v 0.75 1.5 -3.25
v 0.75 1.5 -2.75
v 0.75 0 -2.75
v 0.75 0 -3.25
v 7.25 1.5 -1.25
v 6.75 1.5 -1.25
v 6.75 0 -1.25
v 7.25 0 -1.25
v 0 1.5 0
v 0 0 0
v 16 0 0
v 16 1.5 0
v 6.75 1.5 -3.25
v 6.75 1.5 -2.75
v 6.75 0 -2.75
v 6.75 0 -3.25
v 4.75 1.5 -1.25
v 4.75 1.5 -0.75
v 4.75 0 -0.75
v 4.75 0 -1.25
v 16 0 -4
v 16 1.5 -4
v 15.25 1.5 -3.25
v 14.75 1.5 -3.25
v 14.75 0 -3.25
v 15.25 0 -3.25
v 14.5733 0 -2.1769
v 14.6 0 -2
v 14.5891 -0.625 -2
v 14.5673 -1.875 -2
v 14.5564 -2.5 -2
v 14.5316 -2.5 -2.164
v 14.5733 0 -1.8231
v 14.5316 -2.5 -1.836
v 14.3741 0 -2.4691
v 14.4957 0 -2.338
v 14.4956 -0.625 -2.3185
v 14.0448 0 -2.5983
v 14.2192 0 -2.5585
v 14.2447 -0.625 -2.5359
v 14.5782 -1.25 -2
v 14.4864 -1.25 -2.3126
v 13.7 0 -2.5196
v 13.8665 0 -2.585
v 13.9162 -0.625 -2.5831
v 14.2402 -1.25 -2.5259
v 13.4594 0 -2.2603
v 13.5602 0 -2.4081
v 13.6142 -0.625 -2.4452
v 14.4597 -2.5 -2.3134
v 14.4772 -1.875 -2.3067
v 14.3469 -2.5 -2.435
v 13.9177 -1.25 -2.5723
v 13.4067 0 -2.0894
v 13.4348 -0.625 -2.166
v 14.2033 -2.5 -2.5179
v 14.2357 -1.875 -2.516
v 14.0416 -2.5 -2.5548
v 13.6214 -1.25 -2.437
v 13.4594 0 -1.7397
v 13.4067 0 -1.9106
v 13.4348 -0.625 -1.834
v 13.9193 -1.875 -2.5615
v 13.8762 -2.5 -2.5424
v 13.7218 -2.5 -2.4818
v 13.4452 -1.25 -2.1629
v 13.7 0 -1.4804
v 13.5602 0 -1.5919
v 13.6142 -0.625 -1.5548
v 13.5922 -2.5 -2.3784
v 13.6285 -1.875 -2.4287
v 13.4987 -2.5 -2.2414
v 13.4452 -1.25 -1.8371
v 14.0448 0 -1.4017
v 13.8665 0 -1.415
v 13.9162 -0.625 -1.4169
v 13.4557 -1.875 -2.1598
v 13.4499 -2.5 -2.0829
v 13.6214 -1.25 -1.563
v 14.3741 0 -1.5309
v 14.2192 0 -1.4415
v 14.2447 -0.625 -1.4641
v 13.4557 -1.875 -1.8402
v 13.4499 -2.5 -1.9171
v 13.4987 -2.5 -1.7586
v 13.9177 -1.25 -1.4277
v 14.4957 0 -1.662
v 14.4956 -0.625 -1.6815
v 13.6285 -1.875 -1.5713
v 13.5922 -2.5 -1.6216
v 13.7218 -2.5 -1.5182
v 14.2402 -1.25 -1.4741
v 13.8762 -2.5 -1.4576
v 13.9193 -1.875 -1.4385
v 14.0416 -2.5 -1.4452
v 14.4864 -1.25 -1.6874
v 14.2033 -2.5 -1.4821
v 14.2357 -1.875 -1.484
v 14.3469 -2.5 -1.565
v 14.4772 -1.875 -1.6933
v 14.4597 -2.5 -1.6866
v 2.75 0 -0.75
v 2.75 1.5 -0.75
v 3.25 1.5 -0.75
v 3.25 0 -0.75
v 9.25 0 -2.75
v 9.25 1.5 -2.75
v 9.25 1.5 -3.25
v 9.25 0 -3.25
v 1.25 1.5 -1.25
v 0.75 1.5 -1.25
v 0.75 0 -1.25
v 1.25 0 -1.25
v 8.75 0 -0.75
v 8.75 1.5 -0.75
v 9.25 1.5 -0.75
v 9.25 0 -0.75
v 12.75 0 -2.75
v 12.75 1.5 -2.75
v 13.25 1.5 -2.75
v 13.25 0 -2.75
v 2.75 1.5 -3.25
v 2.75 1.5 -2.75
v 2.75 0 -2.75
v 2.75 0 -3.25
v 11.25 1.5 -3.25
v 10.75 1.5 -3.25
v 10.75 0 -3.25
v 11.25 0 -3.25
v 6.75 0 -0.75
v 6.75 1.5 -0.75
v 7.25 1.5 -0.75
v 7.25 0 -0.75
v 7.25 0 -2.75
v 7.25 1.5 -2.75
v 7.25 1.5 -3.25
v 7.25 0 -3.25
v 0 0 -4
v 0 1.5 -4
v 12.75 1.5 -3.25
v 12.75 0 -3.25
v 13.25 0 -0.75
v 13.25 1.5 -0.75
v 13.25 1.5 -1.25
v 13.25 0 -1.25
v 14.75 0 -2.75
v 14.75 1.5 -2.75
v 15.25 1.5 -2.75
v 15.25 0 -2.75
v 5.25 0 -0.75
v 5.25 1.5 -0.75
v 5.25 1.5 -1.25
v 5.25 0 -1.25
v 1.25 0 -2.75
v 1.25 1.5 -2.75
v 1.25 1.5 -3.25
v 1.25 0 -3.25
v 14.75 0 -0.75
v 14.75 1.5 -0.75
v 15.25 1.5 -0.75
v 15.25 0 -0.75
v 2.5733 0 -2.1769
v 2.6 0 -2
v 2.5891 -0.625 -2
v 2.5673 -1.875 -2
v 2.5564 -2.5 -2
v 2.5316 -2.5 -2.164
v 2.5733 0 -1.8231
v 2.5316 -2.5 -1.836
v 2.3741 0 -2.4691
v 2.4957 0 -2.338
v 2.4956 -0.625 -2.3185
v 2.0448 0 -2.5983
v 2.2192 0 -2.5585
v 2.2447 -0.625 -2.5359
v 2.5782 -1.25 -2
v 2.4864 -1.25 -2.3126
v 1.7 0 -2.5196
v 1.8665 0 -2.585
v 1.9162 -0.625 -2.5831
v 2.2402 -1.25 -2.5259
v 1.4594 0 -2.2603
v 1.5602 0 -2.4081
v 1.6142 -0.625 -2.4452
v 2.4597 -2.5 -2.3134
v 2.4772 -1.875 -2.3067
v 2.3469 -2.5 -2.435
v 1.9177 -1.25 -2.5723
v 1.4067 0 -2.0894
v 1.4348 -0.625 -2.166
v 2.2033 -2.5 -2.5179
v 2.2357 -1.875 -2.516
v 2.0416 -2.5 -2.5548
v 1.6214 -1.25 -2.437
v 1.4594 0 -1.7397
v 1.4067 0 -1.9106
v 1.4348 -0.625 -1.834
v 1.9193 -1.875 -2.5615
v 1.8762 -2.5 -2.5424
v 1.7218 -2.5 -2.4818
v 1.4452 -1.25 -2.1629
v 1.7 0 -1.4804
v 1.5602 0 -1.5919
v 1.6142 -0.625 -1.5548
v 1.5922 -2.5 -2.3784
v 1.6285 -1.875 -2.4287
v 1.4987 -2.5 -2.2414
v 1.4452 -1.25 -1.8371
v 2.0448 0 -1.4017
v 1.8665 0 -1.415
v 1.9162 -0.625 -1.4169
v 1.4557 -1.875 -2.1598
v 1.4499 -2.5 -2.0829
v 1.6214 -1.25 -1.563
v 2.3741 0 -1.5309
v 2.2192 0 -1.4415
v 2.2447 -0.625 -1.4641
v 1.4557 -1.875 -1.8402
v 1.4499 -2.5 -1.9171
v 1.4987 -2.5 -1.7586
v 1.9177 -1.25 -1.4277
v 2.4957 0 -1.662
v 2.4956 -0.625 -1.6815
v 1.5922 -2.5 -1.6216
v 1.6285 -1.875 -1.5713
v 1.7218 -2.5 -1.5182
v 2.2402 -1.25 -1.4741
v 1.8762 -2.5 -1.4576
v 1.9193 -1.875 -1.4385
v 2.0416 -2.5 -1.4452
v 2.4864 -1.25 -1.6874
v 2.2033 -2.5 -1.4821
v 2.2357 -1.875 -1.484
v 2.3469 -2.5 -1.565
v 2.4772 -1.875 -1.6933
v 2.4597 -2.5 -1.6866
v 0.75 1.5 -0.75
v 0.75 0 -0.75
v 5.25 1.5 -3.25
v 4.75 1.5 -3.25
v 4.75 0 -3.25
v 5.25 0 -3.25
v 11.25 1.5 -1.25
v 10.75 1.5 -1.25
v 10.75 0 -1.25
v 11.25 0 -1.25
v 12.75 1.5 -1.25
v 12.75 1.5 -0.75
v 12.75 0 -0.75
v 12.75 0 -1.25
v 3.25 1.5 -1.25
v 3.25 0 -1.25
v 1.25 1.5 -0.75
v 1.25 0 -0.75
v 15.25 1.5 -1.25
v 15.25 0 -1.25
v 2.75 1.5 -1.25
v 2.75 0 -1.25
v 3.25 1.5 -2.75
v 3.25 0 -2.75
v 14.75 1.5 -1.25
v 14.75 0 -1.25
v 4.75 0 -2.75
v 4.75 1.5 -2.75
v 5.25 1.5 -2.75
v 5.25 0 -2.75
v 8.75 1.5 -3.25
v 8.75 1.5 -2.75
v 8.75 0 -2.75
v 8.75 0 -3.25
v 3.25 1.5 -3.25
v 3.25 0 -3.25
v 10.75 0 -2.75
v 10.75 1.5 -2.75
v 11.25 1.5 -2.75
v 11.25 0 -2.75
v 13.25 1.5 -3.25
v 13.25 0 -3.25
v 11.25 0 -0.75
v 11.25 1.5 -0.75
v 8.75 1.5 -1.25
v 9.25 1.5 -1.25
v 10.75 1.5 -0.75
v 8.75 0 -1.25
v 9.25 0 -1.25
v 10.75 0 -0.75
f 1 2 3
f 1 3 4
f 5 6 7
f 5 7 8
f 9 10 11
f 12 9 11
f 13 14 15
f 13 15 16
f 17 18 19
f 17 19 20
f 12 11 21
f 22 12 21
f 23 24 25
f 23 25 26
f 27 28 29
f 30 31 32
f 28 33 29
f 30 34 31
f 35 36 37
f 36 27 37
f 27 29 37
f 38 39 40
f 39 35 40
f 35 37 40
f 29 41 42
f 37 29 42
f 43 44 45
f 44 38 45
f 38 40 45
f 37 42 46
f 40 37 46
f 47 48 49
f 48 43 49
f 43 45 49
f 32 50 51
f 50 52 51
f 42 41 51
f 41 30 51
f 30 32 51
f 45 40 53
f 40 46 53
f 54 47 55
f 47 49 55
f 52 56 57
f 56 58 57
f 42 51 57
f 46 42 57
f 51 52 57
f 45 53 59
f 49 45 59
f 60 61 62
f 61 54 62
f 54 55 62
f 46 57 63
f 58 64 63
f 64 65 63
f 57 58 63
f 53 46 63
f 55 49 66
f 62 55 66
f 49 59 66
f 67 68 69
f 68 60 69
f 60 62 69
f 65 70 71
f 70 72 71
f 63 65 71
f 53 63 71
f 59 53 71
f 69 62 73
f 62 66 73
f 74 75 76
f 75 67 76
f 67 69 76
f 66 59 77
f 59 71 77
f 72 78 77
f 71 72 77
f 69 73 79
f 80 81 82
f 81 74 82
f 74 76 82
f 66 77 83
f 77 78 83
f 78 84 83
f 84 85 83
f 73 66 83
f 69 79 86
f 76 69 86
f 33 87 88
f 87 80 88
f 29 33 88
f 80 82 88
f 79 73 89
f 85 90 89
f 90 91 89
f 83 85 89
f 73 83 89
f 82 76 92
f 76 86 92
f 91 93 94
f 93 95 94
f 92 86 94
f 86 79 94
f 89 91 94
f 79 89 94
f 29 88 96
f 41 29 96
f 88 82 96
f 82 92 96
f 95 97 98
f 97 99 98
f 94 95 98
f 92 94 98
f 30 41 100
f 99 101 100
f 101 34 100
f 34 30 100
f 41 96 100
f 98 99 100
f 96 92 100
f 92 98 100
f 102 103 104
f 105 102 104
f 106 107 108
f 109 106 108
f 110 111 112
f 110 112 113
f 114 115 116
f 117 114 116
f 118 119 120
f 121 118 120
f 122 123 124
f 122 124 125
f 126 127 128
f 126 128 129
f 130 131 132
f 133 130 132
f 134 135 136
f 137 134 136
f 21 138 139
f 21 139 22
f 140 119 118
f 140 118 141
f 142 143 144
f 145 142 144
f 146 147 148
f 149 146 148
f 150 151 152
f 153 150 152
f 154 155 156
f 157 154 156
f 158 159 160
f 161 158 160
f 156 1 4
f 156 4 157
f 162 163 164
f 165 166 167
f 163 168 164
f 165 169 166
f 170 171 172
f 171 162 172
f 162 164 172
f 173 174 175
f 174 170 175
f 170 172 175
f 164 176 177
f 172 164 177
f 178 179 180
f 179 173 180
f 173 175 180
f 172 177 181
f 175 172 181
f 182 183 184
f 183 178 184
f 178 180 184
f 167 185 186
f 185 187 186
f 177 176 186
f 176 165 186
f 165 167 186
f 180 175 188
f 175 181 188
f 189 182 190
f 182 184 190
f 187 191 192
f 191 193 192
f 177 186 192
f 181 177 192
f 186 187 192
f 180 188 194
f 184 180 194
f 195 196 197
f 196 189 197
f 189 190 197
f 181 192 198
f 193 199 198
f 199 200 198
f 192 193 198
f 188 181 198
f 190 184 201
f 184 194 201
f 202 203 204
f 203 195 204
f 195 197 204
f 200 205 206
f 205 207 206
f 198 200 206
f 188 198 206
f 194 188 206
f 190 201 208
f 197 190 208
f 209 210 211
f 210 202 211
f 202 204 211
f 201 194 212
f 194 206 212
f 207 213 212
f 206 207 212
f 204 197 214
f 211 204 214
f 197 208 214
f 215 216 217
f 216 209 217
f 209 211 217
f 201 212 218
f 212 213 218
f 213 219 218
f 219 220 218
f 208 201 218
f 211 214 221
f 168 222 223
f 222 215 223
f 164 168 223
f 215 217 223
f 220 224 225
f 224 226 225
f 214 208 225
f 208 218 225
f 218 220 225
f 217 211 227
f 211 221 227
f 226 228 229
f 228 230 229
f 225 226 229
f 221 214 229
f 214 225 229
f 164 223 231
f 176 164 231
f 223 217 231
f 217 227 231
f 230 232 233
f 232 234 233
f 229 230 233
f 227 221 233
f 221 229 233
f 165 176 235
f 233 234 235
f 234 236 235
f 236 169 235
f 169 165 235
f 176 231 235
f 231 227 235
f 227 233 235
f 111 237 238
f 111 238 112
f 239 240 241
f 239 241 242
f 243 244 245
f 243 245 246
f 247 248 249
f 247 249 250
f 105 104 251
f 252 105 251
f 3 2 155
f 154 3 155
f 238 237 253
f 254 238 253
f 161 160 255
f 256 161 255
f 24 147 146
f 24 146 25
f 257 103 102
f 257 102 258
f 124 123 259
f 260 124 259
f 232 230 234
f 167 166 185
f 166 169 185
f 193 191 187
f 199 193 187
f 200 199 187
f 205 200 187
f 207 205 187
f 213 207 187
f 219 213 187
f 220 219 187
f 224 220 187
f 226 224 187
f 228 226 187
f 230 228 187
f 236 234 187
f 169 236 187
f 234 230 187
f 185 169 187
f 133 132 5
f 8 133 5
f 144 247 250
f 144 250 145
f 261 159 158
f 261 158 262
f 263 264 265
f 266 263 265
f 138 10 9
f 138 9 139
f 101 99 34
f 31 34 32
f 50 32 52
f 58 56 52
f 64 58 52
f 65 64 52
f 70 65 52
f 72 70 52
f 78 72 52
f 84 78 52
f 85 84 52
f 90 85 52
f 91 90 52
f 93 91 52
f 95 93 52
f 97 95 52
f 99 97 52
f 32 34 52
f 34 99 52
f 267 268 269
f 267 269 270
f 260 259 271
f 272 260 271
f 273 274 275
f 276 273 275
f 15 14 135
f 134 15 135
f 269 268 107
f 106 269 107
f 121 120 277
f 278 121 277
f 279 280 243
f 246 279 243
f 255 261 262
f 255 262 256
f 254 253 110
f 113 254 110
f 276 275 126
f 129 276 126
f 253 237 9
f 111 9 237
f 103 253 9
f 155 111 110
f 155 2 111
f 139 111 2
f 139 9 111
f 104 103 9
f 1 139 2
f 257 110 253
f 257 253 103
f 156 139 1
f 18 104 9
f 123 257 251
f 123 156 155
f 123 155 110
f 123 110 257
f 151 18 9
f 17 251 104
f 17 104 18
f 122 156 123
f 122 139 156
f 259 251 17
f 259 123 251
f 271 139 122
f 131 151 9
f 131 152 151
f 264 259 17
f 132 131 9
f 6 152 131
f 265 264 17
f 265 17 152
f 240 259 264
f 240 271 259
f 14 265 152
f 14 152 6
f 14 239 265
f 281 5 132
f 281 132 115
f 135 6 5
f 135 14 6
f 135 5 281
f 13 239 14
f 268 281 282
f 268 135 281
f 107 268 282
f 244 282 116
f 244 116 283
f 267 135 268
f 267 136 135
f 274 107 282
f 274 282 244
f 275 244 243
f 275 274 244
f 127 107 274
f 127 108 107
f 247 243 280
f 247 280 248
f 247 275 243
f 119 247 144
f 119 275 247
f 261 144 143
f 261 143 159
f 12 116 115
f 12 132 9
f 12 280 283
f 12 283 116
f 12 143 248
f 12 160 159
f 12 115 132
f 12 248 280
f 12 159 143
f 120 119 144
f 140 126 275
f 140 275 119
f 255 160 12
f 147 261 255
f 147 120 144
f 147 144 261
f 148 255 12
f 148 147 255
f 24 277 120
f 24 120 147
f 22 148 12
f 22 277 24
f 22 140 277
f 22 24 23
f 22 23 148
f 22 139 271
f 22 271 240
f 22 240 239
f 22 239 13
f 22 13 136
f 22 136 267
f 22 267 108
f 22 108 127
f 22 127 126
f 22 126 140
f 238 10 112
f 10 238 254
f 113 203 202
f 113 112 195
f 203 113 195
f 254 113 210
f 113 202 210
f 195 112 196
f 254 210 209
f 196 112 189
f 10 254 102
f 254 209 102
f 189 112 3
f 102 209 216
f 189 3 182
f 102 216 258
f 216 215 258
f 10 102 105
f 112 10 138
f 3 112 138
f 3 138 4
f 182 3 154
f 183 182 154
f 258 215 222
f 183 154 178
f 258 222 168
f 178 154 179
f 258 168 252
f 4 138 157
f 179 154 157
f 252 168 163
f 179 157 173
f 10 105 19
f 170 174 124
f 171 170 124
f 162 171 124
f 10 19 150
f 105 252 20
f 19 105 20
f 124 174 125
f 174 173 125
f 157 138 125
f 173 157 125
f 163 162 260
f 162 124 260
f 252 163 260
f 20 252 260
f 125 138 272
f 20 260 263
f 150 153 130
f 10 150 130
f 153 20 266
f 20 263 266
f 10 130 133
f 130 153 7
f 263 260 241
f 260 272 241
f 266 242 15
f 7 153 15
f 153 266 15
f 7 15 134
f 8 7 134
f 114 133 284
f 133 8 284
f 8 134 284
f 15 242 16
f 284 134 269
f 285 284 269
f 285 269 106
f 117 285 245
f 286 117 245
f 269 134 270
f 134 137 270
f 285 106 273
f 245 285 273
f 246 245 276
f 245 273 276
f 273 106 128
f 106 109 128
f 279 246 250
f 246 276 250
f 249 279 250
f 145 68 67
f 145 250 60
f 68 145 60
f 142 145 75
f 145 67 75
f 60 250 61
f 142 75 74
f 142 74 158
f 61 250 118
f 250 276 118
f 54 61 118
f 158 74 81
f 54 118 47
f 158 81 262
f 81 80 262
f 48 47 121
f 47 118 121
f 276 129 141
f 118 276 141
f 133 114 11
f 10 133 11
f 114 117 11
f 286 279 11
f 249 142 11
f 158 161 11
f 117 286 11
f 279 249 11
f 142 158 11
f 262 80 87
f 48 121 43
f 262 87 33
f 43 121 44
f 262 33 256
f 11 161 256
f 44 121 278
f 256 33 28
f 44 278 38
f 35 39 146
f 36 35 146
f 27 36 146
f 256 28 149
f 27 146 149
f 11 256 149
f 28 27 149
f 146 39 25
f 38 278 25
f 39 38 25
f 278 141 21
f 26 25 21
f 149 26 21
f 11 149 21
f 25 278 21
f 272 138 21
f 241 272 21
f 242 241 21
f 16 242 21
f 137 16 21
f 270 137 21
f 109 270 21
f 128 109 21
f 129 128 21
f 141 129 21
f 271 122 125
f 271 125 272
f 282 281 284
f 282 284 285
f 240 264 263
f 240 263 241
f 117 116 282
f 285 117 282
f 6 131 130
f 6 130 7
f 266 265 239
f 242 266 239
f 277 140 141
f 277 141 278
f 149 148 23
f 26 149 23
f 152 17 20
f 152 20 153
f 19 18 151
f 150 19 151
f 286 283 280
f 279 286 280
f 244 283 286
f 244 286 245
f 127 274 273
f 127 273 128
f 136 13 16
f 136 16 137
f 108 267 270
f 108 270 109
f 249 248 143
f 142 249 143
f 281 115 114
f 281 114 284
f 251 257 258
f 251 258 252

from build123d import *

# Parameters (mm, degrees)
SKETCH1_W                     = 16
SKETCH1_H                     = 4
BOSS_EXTRUDE1_DEPTH           = 1.5
SKETCH2_W                     = 0.5
SKETCH2_H                     = 0.5
CUT_EXTRUDE1_DEPTH            = 2
SKETCH3_R                     = 0.6
BOSS_EXTRUDE2_DEPTH           = 2.5
BOSS_EXTRUDE2_DRAFT           = -1
BOSS_EXTRUDE2_PROFILE_2_DEPTH = 2.5
BOSS_EXTRUDE2_PROFILE_2_DRAFT = -1


with BuildPart() as part:
    # Sketch1 → Boss-Extrude1 (new body)
    with BuildSketch(Plane(origin=(0, 0, 0), x_dir=(1, 0, 0), z_dir=(0, 1, 0))):
        with Locations((8, 2)):
            Rectangle(SKETCH1_W, SKETCH1_H)
    extrude(amount=BOSS_EXTRUDE1_DEPTH)

    # Sketch2 → Cut-Extrude1 (cut)
    with BuildSketch(Plane(origin=(0, 1.5, 0), x_dir=(1, 0, 0), z_dir=(0, 1, 0))):
        with Locations((3, 3)):
            Rectangle(SKETCH2_W, SKETCH2_H)
        with Locations((1, 3)):
            Rectangle(SKETCH2_W, SKETCH2_H)
        with Locations((5, 3)):
            Rectangle(SKETCH2_W, SKETCH2_H)
        with Locations((7, 3)):
            Rectangle(SKETCH2_W, SKETCH2_H)
        with Locations((9, 3)):
            Rectangle(SKETCH2_W, SKETCH2_H)
        with Locations((11, 3)):
            Rectangle(SKETCH2_W, SKETCH2_H)
        with Locations((13, 3)):
            Rectangle(SKETCH2_W, SKETCH2_H)
        with Locations((15, 3)):
            Rectangle(SKETCH2_W, SKETCH2_H)
        with Locations((17, 3)):
            Rectangle(SKETCH2_W, SKETCH2_H)
        with Locations((19, 3)):
            Rectangle(SKETCH2_W, SKETCH2_H)
        with Locations((21, 3)):
            Rectangle(SKETCH2_W, SKETCH2_H)
        with Locations((23, 3)):
            Rectangle(SKETCH2_W, SKETCH2_H)
        with Locations((25, 3)):
            Rectangle(SKETCH2_W, SKETCH2_H)
        with Locations((27, 3)):
            Rectangle(SKETCH2_W, SKETCH2_H)
        with Locations((29, 3)):
            Rectangle(SKETCH2_W, SKETCH2_H)
        with Locations((31, 3)):
            Rectangle(SKETCH2_W, SKETCH2_H)
        with Locations((33, 3)):
            Rectangle(SKETCH2_W, SKETCH2_H)
        with Locations((35, 3)):
            Rectangle(SKETCH2_W, SKETCH2_H)
        with Locations((1, 1)):
            Rectangle(SKETCH2_W, SKETCH2_H)
        with Locations((3, 1)):
            Rectangle(SKETCH2_W, SKETCH2_H)
        with Locations((5, 1)):
            Rectangle(SKETCH2_W, SKETCH2_H)
        with Locations((7, 1)):
            Rectangle(SKETCH2_W, SKETCH2_H)
        with Locations((9, 1)):
            Rectangle(SKETCH2_W, SKETCH2_H)
        with Locations((11, 1)):
            Rectangle(SKETCH2_W, SKETCH2_H)
        with Locations((13, 1)):
            Rectangle(SKETCH2_W, SKETCH2_H)
        with Locations((15, 1)):
            Rectangle(SKETCH2_W, SKETCH2_H)
        with Locations((17, 1)):
            Rectangle(SKETCH2_W, SKETCH2_H)
        with Locations((19, 1)):
            Rectangle(SKETCH2_W, SKETCH2_H)
        with Locations((21, 1)):
            Rectangle(SKETCH2_W, SKETCH2_H)
        with Locations((23, 1)):
            Rectangle(SKETCH2_W, SKETCH2_H)
        with Locations((25, 1)):
            Rectangle(SKETCH2_W, SKETCH2_H)
        with Locations((27, 1)):
            Rectangle(SKETCH2_W, SKETCH2_H)
        with Locations((29, 1)):
            Rectangle(SKETCH2_W, SKETCH2_H)
        with Locations((31, 1)):
            Rectangle(SKETCH2_W, SKETCH2_H)
        with Locations((33, 1)):
            Rectangle(SKETCH2_W, SKETCH2_H)
        with Locations((35, 1)):
            Rectangle(SKETCH2_W, SKETCH2_H)
    extrude(amount=-CUT_EXTRUDE1_DEPTH, mode=Mode.SUBTRACT)


with BuildPart() as boss_extrude2_tool:
    # Sketch3 → Boss-Extrude2 (with draft: the straight prism first)
    with BuildSketch(Plane(origin=(0, 0, 0), x_dir=(1, 0, 0), z_dir=(0, 1, 0))):
        with Locations((2, 2)):
            Circle(SKETCH3_R)
    extrude(amount=-BOSS_EXTRUDE2_DEPTH)
    # Boss-Extrude2: the draft: its side faces are tilted about the plane it starts from
    boss_extrude2_sides = [boss_extrude2_tool.faces().sort_by_distance(p)[0] for p in [
        (1.4, -1.25, -2),
    ]]
    draft(boss_extrude2_sides, Plane(origin=(0, 0, 0), x_dir=(1, 0, 0), z_dir=(0, 1, 0)), BOSS_EXTRUDE2_DRAFT)


with BuildPart() as part_1:
    add(part.part)

    # Boss-Extrude2: add boss_extrude2_tool
    add(boss_extrude2_tool.part)


with BuildPart() as boss_extrude2_profile_2_tool:
    # Sketch3 → Boss-Extrude2 profile 2 (with draft: the straight prism first)
    with BuildSketch(Plane(origin=(0, 0, 0), x_dir=(1, 0, 0), z_dir=(0, 1, 0))):
        with Locations((14, 2)):
            Circle(SKETCH3_R)
    extrude(amount=-BOSS_EXTRUDE2_PROFILE_2_DEPTH)
    # Boss-Extrude2 profile 2: the draft: its side faces are tilted about the plane it starts from
    boss_extrude2_profile_2_sides = [boss_extrude2_profile_2_tool.faces().sort_by_distance(p)[0] for p in [
        (13.4, -1.25, -2),
    ]]
    draft(boss_extrude2_profile_2_sides, Plane(origin=(0, 0, 0), x_dir=(1, 0, 0), z_dir=(0, 1, 0)), BOSS_EXTRUDE2_PROFILE_2_DRAFT)


with BuildPart() as part_2:
    add(part_1.part)

    # Boss-Extrude2 profile 2: add boss_extrude2_profile_2_tool
    add(boss_extrude2_profile_2_tool.part)


solid = part_2.part
